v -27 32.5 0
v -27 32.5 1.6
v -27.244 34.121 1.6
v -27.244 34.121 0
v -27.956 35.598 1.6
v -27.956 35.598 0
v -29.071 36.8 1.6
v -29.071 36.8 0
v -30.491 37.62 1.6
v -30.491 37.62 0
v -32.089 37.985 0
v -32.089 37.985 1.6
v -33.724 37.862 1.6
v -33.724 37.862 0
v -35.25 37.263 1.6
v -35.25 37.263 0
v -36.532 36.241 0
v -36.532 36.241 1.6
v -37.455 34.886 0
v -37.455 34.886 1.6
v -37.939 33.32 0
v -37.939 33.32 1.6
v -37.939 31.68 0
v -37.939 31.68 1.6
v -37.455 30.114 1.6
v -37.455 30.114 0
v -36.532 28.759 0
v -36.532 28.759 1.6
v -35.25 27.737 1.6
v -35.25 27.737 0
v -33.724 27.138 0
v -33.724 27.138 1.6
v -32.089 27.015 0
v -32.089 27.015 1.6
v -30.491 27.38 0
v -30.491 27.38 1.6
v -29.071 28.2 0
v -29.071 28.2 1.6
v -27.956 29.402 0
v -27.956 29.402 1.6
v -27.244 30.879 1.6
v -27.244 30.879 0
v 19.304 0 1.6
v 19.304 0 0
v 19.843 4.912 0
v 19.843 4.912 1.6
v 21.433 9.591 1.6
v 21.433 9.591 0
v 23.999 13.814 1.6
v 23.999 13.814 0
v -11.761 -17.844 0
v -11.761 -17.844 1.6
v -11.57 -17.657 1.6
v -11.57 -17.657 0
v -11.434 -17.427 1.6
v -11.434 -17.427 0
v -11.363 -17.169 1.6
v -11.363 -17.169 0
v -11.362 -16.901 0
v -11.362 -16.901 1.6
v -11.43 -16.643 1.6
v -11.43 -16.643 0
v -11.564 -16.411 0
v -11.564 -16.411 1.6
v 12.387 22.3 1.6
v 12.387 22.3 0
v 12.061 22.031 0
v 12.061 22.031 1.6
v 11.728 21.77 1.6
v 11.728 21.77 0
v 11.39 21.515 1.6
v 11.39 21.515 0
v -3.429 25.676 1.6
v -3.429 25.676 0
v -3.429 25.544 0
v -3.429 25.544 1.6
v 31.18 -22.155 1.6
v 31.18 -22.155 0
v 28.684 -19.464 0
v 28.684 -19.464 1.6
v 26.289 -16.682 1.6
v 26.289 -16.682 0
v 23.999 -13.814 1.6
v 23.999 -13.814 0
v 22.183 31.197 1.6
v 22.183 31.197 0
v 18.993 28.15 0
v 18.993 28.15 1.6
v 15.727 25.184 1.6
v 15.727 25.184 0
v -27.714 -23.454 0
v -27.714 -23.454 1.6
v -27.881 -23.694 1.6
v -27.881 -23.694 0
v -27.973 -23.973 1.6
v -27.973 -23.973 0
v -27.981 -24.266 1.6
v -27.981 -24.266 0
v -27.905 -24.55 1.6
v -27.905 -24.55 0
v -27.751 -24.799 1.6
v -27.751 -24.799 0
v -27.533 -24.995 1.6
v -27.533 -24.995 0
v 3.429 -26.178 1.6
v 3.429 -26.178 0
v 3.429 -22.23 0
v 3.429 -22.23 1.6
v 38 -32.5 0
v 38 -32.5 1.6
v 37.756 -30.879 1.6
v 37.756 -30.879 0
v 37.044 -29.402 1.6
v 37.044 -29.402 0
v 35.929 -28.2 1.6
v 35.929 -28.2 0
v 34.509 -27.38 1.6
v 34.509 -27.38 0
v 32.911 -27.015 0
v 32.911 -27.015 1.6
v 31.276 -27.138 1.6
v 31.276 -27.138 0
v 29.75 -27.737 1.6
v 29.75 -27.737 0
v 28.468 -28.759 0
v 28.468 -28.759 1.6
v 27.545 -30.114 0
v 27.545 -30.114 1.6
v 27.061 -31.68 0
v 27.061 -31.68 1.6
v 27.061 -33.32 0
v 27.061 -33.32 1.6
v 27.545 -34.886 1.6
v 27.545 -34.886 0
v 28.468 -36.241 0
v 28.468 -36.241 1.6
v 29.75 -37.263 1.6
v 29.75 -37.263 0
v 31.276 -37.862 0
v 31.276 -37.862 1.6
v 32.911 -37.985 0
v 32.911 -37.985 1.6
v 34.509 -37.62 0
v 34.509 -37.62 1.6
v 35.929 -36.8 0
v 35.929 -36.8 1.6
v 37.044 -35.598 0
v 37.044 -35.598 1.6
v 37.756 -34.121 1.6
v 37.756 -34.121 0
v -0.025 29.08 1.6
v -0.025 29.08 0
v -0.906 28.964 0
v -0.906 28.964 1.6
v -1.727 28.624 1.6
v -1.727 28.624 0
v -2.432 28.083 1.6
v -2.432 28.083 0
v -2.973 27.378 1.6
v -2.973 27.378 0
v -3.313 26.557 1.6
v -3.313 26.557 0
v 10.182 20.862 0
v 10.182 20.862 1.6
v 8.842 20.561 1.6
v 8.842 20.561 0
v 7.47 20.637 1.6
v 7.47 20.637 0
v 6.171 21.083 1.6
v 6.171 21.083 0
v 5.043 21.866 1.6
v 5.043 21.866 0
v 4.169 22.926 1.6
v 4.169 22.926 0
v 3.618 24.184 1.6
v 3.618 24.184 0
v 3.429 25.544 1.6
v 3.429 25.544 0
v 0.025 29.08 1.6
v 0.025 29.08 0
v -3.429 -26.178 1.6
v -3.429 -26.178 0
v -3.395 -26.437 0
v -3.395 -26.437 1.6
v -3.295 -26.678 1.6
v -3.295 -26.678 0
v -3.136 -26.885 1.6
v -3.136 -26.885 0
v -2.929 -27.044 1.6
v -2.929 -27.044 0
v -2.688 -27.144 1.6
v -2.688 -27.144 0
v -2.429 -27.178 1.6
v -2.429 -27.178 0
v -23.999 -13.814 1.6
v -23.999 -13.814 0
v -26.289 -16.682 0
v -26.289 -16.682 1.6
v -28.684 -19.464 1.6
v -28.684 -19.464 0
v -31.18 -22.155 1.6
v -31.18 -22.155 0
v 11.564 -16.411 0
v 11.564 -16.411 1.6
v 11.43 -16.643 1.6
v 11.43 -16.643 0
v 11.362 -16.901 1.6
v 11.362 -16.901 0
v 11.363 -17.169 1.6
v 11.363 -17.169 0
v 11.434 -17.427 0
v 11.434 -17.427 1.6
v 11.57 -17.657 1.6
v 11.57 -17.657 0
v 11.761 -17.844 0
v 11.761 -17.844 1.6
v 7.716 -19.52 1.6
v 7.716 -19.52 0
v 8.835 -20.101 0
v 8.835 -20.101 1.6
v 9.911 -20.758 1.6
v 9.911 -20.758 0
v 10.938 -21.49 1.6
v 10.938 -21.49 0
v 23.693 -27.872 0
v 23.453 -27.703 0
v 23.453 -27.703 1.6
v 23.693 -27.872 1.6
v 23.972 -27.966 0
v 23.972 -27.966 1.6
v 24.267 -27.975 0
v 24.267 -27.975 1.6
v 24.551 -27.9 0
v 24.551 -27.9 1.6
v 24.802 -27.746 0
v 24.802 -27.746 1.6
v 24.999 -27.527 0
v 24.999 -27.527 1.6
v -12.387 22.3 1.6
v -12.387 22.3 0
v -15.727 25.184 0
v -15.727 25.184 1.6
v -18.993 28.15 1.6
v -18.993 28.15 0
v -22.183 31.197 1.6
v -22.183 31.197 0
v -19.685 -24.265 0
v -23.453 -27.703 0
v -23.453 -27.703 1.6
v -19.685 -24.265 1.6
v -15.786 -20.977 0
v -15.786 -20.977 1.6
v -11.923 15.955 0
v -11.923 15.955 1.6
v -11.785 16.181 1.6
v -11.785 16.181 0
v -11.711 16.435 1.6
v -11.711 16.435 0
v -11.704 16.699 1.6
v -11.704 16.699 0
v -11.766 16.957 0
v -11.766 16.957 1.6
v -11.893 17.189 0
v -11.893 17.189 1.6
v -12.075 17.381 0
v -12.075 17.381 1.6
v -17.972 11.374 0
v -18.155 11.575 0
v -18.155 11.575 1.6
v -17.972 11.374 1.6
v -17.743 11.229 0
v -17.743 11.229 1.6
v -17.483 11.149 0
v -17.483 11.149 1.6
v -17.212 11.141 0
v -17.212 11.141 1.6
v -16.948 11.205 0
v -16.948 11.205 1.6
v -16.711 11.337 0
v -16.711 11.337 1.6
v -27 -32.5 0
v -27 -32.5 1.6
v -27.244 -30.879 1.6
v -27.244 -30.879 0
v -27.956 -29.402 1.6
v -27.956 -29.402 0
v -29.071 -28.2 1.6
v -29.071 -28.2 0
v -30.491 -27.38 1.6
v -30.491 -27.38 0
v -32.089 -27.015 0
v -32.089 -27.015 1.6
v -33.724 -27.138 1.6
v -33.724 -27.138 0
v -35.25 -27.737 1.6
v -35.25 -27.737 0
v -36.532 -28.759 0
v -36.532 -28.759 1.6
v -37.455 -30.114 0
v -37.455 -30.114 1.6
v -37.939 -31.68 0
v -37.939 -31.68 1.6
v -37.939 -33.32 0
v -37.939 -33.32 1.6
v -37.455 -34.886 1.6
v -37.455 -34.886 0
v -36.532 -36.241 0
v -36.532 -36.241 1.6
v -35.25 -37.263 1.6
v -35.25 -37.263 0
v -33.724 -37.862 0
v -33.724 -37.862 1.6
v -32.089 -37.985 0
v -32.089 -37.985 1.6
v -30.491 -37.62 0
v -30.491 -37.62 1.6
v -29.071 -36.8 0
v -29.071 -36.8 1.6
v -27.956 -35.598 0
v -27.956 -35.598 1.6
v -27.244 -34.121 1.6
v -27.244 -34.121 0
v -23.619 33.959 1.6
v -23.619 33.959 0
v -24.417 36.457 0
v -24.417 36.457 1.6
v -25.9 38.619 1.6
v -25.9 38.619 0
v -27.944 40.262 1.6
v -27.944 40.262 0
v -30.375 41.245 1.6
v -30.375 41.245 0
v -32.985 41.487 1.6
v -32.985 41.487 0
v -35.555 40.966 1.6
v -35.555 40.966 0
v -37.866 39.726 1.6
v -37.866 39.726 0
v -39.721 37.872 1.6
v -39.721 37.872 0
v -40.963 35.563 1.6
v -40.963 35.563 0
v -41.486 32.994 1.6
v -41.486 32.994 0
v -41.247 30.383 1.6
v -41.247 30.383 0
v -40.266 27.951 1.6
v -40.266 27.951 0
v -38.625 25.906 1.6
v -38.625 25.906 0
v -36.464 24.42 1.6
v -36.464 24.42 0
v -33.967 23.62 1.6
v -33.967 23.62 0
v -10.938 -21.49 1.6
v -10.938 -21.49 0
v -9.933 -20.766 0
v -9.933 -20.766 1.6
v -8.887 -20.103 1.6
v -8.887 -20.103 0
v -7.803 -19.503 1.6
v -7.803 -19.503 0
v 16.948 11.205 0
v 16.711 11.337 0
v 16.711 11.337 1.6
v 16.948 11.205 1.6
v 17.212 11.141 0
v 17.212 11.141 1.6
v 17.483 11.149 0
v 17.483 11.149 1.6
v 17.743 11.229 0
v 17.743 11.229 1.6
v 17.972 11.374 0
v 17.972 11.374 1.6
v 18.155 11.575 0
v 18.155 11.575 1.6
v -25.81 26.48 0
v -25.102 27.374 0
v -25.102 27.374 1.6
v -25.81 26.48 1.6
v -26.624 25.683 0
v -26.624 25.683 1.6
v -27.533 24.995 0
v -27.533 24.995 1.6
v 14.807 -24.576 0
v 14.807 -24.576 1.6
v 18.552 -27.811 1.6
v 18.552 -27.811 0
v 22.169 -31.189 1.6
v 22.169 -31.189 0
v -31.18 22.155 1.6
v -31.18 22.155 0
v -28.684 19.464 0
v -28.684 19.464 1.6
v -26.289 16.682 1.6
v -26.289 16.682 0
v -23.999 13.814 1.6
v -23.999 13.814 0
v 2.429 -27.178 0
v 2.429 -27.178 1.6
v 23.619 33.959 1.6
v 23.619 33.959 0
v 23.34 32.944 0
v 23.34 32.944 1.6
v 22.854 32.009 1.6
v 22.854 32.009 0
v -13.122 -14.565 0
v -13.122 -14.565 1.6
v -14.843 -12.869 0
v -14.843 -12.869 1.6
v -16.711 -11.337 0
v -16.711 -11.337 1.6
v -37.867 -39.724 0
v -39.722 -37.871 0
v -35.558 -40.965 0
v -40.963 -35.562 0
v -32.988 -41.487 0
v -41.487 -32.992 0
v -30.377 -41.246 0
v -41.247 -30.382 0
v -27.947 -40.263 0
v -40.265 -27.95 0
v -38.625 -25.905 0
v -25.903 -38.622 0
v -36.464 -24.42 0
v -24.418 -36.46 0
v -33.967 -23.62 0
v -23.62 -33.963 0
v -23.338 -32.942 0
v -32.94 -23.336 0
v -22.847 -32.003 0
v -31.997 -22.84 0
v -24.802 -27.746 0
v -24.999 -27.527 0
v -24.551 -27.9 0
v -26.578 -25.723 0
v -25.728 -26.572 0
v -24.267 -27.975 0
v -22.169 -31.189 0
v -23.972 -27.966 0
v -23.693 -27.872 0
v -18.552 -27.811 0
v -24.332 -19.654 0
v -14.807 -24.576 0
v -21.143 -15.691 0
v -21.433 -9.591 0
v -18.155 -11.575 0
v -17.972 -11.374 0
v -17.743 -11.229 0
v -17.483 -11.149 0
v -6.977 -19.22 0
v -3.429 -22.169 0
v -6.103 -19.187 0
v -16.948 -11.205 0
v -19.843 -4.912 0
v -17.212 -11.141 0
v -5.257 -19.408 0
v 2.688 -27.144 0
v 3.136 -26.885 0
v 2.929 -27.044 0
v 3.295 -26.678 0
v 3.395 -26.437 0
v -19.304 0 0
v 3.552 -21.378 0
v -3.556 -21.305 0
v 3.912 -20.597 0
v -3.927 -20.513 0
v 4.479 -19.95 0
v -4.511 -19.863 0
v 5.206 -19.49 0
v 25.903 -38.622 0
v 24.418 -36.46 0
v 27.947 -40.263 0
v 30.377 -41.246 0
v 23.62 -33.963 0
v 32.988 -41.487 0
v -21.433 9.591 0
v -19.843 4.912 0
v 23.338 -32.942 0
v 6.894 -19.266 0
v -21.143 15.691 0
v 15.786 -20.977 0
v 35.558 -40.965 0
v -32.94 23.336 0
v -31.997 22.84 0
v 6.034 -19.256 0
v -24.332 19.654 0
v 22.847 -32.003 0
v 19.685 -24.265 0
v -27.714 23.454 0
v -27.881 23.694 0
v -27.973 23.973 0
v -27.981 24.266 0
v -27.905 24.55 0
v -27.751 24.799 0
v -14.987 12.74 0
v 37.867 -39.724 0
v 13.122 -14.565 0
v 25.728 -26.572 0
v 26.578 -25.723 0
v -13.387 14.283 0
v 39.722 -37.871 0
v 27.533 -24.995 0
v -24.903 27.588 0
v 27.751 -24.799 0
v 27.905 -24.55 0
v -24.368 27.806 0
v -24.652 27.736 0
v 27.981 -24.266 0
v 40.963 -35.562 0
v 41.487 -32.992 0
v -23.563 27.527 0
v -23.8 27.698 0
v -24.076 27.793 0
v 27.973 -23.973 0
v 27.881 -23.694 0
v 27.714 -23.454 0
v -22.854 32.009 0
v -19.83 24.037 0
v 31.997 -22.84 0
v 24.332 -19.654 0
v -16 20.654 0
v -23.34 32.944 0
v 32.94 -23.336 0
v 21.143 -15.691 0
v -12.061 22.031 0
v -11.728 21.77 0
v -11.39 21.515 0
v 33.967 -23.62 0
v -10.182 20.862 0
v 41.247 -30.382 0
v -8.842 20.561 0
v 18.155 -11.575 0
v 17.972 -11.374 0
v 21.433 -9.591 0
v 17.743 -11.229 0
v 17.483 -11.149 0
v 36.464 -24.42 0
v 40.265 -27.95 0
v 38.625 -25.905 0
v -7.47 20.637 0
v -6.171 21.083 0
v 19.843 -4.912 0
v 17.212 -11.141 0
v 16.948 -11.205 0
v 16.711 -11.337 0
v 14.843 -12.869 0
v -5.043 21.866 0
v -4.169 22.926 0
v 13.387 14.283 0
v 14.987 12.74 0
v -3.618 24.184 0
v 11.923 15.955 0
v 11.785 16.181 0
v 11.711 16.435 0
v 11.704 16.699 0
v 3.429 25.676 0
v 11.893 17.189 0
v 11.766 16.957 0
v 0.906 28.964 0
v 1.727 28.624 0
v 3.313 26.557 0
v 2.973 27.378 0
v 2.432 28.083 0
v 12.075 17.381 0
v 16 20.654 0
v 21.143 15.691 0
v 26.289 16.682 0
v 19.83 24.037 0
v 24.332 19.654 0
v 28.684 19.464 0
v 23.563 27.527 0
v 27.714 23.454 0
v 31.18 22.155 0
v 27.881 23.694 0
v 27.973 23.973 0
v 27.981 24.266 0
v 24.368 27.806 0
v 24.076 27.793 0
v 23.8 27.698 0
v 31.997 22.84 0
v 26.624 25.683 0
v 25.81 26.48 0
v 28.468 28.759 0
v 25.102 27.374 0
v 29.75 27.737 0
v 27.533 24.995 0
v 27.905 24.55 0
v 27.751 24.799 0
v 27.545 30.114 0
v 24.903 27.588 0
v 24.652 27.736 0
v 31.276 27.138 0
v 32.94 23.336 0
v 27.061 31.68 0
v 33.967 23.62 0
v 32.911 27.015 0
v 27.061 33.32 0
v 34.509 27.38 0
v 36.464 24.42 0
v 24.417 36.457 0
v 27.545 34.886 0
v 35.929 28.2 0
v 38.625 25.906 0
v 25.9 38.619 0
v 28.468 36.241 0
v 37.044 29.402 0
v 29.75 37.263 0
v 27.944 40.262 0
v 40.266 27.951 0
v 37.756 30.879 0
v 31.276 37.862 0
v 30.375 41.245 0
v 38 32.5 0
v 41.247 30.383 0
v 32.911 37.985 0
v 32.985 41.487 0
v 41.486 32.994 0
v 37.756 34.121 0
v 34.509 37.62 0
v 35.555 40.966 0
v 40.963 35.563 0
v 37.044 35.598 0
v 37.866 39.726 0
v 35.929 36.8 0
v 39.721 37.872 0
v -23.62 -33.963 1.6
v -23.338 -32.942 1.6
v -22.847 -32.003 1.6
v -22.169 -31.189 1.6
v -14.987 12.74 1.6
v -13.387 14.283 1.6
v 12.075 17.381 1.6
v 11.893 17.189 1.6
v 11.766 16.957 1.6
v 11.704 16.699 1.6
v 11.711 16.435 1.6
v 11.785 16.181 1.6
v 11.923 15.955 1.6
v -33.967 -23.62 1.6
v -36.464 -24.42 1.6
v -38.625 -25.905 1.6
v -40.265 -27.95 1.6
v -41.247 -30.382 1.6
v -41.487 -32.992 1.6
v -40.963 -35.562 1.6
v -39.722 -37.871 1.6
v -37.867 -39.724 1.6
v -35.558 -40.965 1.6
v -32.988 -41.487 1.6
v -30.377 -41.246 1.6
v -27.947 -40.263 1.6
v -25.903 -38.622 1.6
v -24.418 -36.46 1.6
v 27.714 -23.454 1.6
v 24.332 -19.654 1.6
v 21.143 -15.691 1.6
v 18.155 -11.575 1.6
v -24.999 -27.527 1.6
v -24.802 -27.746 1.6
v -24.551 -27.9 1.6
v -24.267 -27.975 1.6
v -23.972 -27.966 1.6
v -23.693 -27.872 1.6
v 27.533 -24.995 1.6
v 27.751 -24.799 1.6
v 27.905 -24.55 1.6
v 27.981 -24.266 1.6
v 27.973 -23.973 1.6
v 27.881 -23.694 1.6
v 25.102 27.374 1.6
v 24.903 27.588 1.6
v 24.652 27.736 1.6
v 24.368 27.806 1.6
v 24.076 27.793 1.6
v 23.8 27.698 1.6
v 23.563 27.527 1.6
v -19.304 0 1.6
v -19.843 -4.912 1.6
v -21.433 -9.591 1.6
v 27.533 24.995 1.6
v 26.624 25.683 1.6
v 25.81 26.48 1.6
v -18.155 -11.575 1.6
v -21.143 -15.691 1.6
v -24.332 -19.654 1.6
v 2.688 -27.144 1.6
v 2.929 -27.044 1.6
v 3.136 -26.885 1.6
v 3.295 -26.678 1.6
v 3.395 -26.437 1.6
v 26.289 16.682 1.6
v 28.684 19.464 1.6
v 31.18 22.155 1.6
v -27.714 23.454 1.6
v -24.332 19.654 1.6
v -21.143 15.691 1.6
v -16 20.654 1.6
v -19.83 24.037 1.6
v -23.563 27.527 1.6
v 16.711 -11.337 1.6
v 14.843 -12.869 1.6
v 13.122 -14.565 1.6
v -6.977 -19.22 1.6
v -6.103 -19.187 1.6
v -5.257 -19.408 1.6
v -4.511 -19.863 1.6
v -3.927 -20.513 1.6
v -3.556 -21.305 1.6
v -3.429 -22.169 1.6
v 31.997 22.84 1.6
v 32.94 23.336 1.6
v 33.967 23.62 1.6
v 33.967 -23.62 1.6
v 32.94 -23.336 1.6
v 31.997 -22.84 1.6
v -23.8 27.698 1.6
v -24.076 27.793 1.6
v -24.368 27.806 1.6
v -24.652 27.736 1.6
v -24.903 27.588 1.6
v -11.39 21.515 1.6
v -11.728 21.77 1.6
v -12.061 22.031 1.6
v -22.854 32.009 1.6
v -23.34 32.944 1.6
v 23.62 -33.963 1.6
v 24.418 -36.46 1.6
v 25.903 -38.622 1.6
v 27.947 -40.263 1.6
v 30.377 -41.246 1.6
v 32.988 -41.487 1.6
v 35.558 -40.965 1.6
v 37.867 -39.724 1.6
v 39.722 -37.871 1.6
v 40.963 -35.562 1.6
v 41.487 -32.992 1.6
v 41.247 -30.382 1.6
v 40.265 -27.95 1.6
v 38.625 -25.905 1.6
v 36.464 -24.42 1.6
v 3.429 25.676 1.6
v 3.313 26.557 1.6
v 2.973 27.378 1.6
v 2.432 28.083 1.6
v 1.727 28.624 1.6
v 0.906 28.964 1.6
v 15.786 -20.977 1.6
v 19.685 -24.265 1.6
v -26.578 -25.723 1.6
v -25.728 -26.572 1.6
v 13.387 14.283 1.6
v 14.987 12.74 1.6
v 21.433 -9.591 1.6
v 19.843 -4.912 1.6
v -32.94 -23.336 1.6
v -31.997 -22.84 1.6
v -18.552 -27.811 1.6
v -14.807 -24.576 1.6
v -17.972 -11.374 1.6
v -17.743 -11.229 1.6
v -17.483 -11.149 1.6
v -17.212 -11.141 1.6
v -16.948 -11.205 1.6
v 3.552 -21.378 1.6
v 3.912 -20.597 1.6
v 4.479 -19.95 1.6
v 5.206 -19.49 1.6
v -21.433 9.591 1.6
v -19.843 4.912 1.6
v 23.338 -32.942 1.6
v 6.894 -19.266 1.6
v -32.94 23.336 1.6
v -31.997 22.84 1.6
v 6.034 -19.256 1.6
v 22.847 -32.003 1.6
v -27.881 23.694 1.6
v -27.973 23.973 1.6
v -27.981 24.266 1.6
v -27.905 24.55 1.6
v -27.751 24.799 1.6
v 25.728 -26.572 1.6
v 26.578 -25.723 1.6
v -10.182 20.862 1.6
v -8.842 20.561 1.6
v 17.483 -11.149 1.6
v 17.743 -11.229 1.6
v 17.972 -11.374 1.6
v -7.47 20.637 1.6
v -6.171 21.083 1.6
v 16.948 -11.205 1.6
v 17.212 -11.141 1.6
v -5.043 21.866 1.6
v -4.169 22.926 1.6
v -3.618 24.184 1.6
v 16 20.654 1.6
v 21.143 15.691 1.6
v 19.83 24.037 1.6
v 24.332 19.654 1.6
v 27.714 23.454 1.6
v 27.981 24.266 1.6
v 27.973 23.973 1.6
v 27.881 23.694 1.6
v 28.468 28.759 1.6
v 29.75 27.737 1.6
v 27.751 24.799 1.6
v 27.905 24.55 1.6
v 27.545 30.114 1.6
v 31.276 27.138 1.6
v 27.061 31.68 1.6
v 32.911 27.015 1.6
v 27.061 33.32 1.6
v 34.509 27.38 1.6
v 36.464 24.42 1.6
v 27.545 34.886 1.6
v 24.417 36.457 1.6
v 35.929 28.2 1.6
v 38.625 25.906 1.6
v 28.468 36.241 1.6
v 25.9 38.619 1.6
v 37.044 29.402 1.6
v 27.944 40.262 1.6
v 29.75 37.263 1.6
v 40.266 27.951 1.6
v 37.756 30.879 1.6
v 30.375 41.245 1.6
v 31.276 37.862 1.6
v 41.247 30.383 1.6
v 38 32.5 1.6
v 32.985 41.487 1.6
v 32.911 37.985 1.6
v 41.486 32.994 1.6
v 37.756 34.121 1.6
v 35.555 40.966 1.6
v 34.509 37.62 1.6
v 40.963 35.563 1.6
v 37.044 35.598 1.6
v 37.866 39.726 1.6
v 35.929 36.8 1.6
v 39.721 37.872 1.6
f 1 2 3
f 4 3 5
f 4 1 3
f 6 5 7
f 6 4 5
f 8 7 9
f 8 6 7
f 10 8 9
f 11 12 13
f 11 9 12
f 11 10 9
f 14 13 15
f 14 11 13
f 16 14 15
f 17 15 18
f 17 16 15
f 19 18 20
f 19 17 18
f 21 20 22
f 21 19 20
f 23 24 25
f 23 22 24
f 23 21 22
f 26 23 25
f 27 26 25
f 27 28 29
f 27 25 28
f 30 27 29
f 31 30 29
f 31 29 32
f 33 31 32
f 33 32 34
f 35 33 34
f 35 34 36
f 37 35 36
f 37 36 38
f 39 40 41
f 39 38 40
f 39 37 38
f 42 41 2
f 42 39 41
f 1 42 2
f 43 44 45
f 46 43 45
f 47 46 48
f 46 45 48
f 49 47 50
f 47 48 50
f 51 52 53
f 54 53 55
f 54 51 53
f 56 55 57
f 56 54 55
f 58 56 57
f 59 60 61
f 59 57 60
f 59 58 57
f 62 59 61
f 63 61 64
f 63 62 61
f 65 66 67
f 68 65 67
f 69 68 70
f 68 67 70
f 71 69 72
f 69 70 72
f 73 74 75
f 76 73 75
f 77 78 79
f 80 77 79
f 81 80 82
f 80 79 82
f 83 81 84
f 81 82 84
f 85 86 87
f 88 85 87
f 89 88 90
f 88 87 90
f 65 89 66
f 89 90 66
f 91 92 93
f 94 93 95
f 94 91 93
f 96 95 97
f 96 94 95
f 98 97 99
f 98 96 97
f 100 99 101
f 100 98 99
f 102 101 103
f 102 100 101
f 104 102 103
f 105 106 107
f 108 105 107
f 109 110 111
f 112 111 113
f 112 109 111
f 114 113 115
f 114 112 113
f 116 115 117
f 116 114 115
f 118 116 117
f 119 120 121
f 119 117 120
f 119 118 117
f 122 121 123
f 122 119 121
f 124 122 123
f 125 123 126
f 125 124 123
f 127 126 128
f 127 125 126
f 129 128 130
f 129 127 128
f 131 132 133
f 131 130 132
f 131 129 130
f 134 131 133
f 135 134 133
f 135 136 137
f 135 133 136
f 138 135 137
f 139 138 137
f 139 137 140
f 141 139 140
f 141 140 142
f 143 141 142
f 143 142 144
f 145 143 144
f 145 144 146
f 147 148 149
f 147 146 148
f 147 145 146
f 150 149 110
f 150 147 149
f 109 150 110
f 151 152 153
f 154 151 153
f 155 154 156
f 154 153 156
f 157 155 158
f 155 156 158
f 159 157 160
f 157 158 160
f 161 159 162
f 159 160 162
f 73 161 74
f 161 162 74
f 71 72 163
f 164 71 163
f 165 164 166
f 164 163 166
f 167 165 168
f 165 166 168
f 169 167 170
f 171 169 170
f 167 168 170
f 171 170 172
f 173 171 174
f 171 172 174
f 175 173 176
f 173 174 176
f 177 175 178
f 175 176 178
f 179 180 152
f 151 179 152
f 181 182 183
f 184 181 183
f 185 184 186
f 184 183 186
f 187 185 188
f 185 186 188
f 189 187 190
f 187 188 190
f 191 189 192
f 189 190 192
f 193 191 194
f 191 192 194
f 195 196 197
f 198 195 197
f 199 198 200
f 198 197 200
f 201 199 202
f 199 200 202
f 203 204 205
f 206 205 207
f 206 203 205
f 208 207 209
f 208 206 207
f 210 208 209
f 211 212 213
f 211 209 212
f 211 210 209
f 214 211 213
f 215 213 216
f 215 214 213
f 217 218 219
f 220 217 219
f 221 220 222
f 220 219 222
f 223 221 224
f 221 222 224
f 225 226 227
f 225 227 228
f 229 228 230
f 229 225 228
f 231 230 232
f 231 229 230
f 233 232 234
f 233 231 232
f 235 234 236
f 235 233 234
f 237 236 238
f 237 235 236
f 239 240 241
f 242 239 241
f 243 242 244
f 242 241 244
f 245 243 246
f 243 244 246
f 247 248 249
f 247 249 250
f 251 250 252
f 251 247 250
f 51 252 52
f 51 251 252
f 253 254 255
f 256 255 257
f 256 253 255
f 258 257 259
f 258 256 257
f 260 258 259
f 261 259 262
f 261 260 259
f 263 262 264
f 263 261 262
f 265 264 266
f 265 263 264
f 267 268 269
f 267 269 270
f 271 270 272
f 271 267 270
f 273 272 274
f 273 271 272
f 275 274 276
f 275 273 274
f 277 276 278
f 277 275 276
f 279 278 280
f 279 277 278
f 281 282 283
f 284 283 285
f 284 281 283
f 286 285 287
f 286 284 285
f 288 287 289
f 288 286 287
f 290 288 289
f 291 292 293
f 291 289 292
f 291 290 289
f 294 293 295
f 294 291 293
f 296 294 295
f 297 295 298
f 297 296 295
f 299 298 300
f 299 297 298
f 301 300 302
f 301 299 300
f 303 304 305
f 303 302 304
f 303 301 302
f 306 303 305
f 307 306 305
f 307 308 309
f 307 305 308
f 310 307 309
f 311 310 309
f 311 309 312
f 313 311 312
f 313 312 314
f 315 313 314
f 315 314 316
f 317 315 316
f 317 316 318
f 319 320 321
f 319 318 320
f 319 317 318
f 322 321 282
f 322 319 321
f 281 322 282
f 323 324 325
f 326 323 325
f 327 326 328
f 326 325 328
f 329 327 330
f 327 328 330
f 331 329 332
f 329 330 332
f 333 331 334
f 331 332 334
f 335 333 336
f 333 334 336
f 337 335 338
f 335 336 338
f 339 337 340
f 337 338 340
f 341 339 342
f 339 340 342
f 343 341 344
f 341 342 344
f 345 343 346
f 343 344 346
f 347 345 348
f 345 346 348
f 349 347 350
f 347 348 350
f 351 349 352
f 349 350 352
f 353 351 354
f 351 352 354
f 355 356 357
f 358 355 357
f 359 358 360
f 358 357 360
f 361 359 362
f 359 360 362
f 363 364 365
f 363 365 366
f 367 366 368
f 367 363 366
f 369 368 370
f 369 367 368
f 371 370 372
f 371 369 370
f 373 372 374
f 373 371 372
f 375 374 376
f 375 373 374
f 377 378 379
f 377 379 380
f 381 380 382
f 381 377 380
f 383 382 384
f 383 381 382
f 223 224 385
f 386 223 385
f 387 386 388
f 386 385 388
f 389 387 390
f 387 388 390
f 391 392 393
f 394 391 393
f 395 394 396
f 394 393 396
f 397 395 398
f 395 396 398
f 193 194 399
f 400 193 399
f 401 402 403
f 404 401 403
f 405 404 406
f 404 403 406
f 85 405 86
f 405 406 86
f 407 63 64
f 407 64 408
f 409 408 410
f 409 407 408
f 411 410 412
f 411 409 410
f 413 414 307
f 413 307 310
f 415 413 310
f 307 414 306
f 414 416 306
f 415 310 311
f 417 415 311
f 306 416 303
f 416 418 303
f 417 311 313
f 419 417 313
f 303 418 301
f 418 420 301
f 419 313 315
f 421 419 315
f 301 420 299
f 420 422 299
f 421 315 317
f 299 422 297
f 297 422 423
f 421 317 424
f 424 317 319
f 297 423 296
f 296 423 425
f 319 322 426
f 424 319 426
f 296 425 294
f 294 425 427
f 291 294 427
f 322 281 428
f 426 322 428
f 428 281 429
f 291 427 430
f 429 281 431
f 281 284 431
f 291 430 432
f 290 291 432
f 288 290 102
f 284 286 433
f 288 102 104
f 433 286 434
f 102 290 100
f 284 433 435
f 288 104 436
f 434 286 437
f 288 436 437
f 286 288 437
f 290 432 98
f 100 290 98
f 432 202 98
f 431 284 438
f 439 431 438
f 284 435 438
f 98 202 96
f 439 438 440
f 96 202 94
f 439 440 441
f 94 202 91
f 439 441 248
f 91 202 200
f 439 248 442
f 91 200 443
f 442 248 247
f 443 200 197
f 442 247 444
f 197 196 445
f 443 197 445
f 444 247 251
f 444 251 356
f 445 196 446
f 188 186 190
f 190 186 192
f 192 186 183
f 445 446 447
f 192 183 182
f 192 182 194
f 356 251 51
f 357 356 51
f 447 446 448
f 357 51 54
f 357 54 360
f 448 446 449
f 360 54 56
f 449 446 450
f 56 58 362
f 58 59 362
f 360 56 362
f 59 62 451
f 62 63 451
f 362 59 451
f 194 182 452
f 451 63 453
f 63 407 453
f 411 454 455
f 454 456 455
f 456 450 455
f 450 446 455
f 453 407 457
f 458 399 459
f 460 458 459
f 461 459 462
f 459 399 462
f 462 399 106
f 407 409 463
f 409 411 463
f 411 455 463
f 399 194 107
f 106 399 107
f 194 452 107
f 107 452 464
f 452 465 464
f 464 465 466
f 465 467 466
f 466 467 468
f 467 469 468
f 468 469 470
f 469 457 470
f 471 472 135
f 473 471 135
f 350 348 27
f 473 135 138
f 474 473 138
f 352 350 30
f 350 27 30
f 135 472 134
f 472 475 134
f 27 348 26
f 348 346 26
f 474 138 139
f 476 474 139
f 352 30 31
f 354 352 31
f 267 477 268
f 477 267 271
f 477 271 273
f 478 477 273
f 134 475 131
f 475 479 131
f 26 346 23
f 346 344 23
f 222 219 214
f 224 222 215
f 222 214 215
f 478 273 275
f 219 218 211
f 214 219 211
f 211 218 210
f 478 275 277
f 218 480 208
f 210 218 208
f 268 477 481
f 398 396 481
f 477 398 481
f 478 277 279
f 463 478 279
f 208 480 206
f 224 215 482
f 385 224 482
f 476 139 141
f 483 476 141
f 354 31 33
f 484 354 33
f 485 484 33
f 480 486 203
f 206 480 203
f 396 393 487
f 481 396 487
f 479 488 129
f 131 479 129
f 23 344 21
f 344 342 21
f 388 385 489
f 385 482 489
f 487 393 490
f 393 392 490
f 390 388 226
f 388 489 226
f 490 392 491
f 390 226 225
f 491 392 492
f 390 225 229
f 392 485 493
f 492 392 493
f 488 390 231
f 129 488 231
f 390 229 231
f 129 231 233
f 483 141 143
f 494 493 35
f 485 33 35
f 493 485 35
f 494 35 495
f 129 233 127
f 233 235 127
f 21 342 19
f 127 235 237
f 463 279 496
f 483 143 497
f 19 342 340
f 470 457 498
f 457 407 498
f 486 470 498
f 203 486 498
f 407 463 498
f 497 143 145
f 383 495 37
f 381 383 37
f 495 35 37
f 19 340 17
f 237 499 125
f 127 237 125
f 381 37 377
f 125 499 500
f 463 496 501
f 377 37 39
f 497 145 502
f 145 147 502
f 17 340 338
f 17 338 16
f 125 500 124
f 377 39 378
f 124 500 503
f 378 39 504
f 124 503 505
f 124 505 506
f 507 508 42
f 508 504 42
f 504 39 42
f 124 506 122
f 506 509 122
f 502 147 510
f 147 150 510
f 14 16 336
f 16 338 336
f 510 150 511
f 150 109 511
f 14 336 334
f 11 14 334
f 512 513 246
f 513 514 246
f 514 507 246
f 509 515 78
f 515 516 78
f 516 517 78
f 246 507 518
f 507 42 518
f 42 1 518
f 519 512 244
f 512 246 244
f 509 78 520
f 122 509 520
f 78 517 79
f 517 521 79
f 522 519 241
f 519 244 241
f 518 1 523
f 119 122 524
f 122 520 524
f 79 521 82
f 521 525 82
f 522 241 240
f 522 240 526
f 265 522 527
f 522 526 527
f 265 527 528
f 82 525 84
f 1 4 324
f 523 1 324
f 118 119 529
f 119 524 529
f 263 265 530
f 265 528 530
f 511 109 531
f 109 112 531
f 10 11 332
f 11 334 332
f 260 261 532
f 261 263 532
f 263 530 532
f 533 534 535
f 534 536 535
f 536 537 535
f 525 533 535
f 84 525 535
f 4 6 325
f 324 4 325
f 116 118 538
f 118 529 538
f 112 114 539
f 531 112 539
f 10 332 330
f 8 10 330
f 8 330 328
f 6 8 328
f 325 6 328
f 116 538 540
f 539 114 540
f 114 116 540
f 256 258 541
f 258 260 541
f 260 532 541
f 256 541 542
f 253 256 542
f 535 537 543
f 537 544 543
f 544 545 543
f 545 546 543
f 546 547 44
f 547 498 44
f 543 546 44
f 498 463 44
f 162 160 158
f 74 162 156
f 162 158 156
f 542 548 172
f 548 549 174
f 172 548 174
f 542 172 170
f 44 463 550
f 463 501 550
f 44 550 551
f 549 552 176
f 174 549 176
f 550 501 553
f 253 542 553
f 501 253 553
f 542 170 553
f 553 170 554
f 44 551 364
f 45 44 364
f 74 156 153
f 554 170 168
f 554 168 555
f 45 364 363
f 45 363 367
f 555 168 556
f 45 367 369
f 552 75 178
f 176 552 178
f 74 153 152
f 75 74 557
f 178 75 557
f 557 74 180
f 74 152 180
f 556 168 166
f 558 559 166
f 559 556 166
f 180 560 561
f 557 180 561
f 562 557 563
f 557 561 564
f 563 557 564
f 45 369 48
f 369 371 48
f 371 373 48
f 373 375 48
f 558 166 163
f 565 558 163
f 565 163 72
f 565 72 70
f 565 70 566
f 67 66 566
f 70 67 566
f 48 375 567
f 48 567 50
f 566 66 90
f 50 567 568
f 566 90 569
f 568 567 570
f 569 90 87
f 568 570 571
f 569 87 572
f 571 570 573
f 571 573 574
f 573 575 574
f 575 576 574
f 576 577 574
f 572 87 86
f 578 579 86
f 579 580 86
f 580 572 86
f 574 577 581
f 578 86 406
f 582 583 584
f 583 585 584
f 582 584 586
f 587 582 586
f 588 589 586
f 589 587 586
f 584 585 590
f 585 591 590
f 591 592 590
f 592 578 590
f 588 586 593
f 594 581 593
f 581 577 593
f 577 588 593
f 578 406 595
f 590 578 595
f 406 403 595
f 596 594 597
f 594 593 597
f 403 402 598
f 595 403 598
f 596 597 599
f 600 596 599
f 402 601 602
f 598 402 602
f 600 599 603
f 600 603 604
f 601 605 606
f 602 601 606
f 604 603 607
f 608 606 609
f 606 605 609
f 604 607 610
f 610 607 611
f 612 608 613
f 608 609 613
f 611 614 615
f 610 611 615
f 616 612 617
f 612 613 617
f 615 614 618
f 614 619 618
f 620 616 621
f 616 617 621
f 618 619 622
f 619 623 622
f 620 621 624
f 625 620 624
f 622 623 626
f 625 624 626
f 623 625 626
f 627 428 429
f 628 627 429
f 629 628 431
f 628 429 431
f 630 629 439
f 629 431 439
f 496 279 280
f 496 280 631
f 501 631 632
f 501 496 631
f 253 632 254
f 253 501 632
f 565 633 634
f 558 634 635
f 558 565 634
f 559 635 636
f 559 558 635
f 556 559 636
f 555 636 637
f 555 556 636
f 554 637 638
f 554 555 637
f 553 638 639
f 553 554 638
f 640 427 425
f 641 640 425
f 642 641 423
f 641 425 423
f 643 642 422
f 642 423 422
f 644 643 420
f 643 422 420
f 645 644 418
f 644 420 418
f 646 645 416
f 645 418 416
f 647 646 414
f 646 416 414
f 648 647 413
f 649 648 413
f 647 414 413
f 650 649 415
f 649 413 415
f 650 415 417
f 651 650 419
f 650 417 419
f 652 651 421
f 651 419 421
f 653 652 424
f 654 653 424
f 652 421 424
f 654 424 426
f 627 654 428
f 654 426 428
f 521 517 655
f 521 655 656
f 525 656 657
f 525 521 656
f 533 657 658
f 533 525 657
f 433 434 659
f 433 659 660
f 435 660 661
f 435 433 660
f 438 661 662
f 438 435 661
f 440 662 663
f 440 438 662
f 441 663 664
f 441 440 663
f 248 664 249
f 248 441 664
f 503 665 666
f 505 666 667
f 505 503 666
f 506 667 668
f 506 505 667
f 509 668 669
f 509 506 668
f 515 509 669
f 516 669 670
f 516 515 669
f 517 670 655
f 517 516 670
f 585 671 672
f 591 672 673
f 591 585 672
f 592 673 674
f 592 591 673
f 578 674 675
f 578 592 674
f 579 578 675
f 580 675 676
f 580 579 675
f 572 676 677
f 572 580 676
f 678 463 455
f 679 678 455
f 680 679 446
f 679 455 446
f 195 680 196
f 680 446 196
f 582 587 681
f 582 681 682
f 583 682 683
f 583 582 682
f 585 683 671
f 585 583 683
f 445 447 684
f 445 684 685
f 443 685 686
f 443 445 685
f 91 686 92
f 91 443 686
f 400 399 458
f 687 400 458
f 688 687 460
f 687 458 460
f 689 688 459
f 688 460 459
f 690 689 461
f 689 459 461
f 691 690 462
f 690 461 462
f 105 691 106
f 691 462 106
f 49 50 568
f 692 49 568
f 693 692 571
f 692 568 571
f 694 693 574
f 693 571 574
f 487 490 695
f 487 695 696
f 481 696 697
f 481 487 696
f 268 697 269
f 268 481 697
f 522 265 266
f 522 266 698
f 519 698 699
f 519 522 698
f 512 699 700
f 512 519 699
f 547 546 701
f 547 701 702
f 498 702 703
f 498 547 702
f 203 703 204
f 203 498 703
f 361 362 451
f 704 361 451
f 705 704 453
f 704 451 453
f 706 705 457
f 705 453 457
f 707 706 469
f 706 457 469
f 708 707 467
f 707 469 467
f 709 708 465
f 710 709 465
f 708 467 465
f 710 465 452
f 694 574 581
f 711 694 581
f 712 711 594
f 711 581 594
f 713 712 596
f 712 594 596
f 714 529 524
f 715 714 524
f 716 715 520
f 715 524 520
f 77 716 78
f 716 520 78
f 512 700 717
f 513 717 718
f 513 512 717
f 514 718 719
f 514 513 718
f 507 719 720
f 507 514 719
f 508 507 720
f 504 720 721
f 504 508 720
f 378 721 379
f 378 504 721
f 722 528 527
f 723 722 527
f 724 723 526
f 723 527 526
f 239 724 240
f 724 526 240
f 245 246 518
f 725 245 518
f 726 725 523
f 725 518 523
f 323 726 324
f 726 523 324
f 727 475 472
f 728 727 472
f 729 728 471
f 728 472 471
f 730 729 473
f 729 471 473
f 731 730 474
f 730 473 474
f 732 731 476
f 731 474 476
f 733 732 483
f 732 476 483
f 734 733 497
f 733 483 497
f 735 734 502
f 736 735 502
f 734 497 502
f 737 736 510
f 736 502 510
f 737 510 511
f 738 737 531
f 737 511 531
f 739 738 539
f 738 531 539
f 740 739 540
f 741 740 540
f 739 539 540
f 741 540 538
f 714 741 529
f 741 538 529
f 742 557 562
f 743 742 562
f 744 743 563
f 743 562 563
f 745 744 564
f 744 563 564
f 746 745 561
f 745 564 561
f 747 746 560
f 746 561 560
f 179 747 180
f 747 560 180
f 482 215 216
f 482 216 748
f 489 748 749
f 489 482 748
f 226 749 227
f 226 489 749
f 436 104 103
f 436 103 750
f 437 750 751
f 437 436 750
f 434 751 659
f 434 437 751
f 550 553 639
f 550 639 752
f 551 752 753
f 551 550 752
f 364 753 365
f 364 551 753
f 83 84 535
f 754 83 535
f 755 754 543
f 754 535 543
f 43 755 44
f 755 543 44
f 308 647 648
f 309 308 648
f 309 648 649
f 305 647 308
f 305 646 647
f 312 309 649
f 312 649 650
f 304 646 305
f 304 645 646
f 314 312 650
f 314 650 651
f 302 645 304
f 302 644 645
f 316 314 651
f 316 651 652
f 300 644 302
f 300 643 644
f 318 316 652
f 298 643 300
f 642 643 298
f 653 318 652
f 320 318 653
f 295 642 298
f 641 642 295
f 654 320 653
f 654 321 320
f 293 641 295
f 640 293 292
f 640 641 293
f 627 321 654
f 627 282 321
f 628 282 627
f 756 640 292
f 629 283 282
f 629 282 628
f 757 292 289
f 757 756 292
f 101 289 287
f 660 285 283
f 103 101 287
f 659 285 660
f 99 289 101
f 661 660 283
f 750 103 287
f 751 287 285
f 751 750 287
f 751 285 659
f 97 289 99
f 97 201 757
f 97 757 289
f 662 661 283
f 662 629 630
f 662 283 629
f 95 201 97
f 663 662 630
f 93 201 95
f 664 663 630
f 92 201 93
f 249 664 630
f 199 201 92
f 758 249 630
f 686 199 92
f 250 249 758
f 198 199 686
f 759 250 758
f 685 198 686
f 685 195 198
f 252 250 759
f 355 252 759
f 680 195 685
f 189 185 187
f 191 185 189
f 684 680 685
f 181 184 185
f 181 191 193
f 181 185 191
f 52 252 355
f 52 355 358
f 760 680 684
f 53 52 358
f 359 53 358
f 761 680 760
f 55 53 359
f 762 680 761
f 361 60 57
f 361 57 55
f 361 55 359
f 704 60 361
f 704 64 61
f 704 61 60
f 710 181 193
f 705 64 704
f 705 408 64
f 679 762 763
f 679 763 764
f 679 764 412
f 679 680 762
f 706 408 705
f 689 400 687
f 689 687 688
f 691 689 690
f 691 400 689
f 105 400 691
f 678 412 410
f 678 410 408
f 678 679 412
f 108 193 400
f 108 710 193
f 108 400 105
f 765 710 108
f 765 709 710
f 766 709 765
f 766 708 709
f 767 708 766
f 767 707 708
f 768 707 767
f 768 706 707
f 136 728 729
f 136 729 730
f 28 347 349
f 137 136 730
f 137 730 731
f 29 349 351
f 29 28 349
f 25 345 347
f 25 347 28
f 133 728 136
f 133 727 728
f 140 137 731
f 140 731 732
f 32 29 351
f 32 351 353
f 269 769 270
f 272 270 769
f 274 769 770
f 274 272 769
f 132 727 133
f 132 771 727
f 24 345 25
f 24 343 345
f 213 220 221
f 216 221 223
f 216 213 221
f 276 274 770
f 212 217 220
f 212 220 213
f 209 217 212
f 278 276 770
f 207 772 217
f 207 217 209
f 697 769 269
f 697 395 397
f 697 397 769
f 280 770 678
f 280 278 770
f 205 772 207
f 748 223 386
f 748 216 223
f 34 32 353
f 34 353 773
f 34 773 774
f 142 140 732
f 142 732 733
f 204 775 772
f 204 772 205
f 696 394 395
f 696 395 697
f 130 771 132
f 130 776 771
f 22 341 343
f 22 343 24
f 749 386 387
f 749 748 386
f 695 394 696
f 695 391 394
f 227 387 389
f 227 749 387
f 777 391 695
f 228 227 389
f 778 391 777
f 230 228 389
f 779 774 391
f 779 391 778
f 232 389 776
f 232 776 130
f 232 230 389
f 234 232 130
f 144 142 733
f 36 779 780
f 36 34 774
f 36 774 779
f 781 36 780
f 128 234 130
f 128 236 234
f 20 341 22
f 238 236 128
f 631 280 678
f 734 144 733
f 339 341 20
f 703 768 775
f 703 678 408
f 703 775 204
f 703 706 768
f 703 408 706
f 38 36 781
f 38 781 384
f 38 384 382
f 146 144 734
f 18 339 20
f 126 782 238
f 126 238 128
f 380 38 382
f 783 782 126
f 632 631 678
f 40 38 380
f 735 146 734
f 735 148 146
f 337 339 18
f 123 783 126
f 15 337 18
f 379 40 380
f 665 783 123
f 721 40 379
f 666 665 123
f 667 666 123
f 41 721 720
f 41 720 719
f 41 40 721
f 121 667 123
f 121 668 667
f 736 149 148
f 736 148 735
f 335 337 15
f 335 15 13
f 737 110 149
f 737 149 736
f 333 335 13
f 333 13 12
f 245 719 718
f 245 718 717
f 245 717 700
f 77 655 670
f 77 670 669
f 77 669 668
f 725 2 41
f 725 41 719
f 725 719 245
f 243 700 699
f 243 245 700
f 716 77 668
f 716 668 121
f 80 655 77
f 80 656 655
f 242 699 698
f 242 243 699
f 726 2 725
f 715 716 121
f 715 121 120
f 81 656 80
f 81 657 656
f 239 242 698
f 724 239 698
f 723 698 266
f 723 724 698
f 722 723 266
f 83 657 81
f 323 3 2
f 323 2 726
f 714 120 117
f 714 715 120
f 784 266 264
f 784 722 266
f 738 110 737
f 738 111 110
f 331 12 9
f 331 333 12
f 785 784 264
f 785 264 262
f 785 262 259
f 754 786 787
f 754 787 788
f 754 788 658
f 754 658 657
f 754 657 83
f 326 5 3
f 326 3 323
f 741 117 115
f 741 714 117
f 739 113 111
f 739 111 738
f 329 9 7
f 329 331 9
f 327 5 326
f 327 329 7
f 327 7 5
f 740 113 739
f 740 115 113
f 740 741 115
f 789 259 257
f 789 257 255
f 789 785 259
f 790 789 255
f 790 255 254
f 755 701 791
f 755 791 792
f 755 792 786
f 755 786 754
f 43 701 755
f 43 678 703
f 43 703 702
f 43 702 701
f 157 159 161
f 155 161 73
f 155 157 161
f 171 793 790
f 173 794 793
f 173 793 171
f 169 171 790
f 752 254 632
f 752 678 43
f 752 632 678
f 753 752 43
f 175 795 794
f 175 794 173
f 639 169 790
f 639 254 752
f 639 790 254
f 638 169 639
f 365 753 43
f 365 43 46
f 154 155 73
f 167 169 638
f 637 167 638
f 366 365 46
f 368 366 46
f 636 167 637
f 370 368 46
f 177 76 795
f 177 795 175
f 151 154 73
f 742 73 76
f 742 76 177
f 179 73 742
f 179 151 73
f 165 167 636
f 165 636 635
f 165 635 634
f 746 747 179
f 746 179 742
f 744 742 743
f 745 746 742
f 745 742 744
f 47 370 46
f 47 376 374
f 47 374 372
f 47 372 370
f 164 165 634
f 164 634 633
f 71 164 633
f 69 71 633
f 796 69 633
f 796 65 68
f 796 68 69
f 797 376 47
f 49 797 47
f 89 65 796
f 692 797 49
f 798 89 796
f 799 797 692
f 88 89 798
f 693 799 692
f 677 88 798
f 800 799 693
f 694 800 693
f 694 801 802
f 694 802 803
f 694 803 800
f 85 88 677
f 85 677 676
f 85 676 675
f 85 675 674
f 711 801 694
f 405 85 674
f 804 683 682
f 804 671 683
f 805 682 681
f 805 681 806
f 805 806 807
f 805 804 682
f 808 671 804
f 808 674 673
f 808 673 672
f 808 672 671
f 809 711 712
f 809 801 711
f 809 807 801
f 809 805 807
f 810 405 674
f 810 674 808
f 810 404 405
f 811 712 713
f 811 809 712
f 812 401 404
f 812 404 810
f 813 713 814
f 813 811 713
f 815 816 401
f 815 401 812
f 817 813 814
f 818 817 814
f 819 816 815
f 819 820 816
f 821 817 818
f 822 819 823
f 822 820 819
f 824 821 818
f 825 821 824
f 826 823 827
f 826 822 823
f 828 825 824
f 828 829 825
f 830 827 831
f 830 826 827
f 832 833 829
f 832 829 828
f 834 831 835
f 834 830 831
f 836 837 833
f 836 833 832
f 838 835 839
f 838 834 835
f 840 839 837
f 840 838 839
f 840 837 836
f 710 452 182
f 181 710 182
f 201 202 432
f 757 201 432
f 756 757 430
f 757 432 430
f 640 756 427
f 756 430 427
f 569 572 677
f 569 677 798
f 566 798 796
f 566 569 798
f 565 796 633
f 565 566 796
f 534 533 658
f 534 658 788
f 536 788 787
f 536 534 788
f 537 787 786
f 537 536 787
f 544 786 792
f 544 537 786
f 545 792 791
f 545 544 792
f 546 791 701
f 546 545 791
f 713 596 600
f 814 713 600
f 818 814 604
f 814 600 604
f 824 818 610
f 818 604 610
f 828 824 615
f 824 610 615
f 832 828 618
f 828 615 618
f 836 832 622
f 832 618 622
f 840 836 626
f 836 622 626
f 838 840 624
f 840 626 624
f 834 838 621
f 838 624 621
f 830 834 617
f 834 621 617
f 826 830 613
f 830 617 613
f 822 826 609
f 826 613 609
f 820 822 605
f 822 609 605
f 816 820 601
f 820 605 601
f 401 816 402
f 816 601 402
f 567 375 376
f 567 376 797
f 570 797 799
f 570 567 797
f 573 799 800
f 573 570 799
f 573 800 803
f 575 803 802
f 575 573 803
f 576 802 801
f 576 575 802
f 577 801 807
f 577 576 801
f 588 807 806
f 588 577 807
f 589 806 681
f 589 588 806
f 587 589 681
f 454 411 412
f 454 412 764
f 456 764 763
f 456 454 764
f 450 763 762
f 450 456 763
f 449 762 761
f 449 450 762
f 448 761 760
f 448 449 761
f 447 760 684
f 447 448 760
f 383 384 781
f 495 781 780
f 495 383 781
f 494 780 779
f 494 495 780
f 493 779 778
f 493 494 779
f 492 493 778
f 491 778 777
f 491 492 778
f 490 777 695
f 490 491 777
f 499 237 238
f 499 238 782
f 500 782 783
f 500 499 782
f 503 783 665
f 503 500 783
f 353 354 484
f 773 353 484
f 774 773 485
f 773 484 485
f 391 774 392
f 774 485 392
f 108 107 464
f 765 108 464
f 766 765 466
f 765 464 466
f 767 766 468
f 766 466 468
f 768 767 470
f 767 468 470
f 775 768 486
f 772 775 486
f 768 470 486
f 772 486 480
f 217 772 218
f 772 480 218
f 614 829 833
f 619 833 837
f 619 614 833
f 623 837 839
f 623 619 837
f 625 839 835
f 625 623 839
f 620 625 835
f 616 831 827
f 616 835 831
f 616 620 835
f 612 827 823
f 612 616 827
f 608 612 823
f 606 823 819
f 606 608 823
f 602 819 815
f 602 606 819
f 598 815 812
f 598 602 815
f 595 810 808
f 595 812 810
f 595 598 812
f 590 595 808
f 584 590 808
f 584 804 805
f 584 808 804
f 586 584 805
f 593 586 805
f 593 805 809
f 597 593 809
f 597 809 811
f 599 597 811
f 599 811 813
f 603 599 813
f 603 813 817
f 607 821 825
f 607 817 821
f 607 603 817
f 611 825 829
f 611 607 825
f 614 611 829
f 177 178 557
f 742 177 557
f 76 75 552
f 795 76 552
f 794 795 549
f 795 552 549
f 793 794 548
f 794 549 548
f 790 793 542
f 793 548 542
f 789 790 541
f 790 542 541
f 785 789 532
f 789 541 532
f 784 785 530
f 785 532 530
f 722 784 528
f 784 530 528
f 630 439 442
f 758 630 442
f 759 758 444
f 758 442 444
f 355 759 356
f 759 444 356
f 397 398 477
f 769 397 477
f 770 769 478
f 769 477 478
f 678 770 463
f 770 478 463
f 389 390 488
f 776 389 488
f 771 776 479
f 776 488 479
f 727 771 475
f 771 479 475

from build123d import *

# Parameters (mm, degrees)
BOSS_EXTRUDE1_DEPTH = 1.6
SKETCH1_5_R         = 5.5
CUT_EXTRUDE3_DEPTH  = 59.711668346


with BuildPart() as part:
    # Sketch1 → Boss-Extrude1 (new body)
    with BuildSketch(Plane.XY):
        with BuildLine():
            Line((-3.429, -22.169410702), (-3.429, -26.178))
            ThreePointArc((-3.429, -26.178), (-3.136106781, -26.885106781), (-2.429, -27.178))
            Line((-2.429, -27.178), (2.429, -27.178))
            ThreePointArc((2.429, -27.178), (3.136106781, -26.885106781), (3.429, -26.178))
            Line((3.429, -26.178), (3.429, -22.22966812))
            ThreePointArc((3.429, -22.22966812), (4.826254657, -19.693685595), (7.716471578, -19.519978666))
            ThreePointArc((7.716471578, -19.519978666), (9.379032197, -20.419956769), (10.937907763, -21.489524611))
            ThreePointArc((10.937907763, -21.489524611), (16.695290309, -26.175210804), (22.169453406, -31.188856909))
            ThreePointArc((22.169453406, -31.188856909), (23.117301861, -32.459556006), (23.619723106, -33.963107063))
            ThreePointArc((23.619723106, -33.963107063), (38.862466656, -38.865455055), (33.967276916, -23.620411133))
            ThreePointArc((33.967276916, -23.620411133), (32.455427267, -23.112806715), (31.180313141, -22.154978144))
            ThreePointArc((31.180313141, -22.154978144), (27.47385025, -18.084321842), (23.999156064, -13.81412159))
            ThreePointArc((23.999156064, -13.81412159), (20.509860624, -7.295108734), (19.304, 0))
            ThreePointArc((19.304, 0), (20.509860624, 7.295108734), (23.999156064, 13.81412159))
            ThreePointArc((23.999156064, 13.81412159), (27.47385025, 18.084321842), (31.180313141, 22.154978144))
            ThreePointArc((31.180313141, 22.154978144), (32.455427267, 23.112806715), (33.967276916, 23.620411133))
            ThreePointArc((33.967276916, 23.620411133), (38.861014354, 38.866906343), (23.61905648, 33.959055239))
            ThreePointArc((23.61905648, 33.959055239), (23.121622823, 32.463531472), (22.183380489, 31.19714571))
            ThreePointArc((22.183380489, 31.19714571), (17.368920037, 26.656724902), (12.387395689, 22.300250899))
            ThreePointArc((12.387395689, 22.300250899), (11.895164251, 21.899521015), (11.389978134, 21.515251299))
            ThreePointArc((11.389978134, 21.515251299), (6.171223513, 21.083006766), (3.429, 25.544222445))
            Line((3.429, 25.544222445), (3.429, 25.6764))
            ThreePointArc((3.429, 25.6764), (2.43210864, 28.08310864), (0.0254, 29.08))
            Line((0.0254, 29.08), (-0.0254, 29.08))
            ThreePointArc((-0.0254, 29.08), (-2.43210864, 28.08310864), (-3.429, 25.6764))
            Line((-3.429, 25.6764), (-3.429, 25.544222445))
            ThreePointArc((-3.429, 25.544222445), (-6.171223513, 21.083006766), (-11.389978134, 21.515251299))
            ThreePointArc((-11.389978134, 21.515251299), (-11.895164251, 21.899521015), (-12.387395689, 22.300250899))
            ThreePointArc((-12.387395689, 22.300250899), (-17.368920037, 26.656724902), (-22.183380489, 31.19714571))
            ThreePointArc((-22.183380489, 31.19714571), (-23.121622823, 32.463531472), (-23.61905648, 33.959055239))
            ThreePointArc((-23.61905648, 33.959055239), (-38.861014354, 38.866906343), (-33.967276916, 23.620411133))
            ThreePointArc((-33.967276916, 23.620411133), (-32.455427267, 23.112806715), (-31.180313141, 22.154978144))
            ThreePointArc((-31.180313141, 22.154978144), (-27.47385025, 18.084321842), (-23.999156064, 13.81412159))
            ThreePointArc((-23.999156064, 13.81412159), (-20.509860624, 7.295108734), (-19.304, 0))
            ThreePointArc((-19.304, 0), (-20.509860624, -7.295108734), (-23.999156064, -13.81412159))
            ThreePointArc((-23.999156064, -13.81412159), (-27.47385025, -18.084321842), (-31.180313141, -22.154978144))
            ThreePointArc((-31.180313141, -22.154978144), (-32.455427267, -23.112806715), (-33.967276916, -23.620411133))
            ThreePointArc((-33.967276916, -23.620411133), (-38.862466656, -38.865455055), (-23.619723106, -33.963107063))
            ThreePointArc((-23.619723106, -33.963107063), (-23.117301861, -32.459556006), (-22.169453406, -31.188856909))
            ThreePointArc((-22.169453406, -31.188856909), (-16.695290309, -26.175210804), (-10.937907763, -21.489524611))
            ThreePointArc((-10.937907763, -21.489524611), (-9.414925724, -20.426362093), (-7.803463878, -19.502793172))
            ThreePointArc((-7.803463878, -19.502793172), (-4.867492977, -19.607829975), (-3.429, -22.169410702))
        make_face()
    extrude(amount=BOSS_EXTRUDE1_DEPTH)

    # Sketch1<5> → Cut-Extrude3 (cut, through all)
    with BuildSketch(Plane.XY):
        with Locations((-32.5, -32.5)):
            Circle(SKETCH1_5_R)
        with Locations((32.5, -32.5)):
            Circle(SKETCH1_5_R)
        with Locations((32.5, 32.5)):
            Circle(SKETCH1_5_R)
        with Locations((-32.5, 32.5)):
            Circle(SKETCH1_5_R)
        with BuildLine():
            ThreePointArc((-24.998680714, -27.527052285), (-24.266539251, -27.975169466), (-23.452541635, -27.702684585))
            ThreePointArc((-23.452541635, -27.702684585), (-17.751335536, -22.602028101), (-11.761197607, -17.84401432))
            ThreePointArc((-11.761197607, -17.84401432), (-11.363038546, -17.168840008), (-11.563944828, -16.411193879))
            ThreePointArc((-11.563944828, -16.411193879), (-13.962913518, -13.697220596), (-16.710750131, -11.337115576))
            ThreePointArc((-16.710750131, -11.337115576), (-17.483496193, -11.148963344), (-18.155018506, -11.575103607))
            ThreePointArc((-18.155018506, -11.575103607), (-22.713350188, -17.692311571), (-27.713994469, -23.453576864))
            ThreePointArc((-27.713994469, -23.453576864), (-27.981074308, -24.266291585), (-27.532770213, -24.994893189))
            ThreePointArc((-27.532770213, -24.994893189), (-26.138464304, -26.133614559), (-24.998680714, -27.527052285))
        make_face()
        with BuildLine():
            ThreePointArc((18.155018506, -11.575103607), (17.483496193, -11.148963344), (16.710750131, -11.337115576))
            ThreePointArc((16.710750131, -11.337115576), (13.962913518, -13.697220596), (11.563944828, -16.411193879))
            ThreePointArc((11.563944828, -16.411193879), (11.363038546, -17.168840008), (11.761197607, -17.84401432))
            ThreePointArc((11.761197607, -17.84401432), (17.751335536, -22.602028101), (23.452541635, -27.702684585))
            ThreePointArc((23.452541635, -27.702684585), (24.266539251, -27.975169466), (24.998680714, -27.527052285))
            ThreePointArc((24.998680714, -27.527052285), (26.138464304, -26.133614559), (27.532770213, -24.994893189))
            ThreePointArc((27.532770213, -24.994893189), (27.981074308, -24.266291585), (27.713994469, -23.453576864))
            ThreePointArc((27.713994469, -23.453576864), (22.713350188, -17.692311571), (18.155018506, -11.575103607))
        make_face()
        with BuildLine():
            ThreePointArc((-12.074975691, 17.380952209), (-17.927124595, 22.331716527), (-23.562984675, 27.527368101))
            ThreePointArc((-23.562984675, 27.527368101), (-24.368188535, 27.806201558), (-25.102498374, 27.37389332))
            ThreePointArc((-25.102498374, 27.37389332), (-26.204243006, 26.068558181), (-27.532770213, 24.994893189))
            ThreePointArc((-27.532770213, 24.994893189), (-27.981074308, 24.266291585), (-27.713994469, 23.453576864))
            ThreePointArc((-27.713994469, 23.453576864), (-22.713350188, 17.692311571), (-18.155018506, 11.575103607))
            ThreePointArc((-18.155018506, 11.575103607), (-17.483496193, 11.148963344), (-16.710750131, 11.337115576))
            ThreePointArc((-16.710750131, 11.337115576), (-14.170722957, 13.494587833), (-11.922695283, 15.954830943))
            ThreePointArc((-11.922695283, 15.954830943), (-11.704234617, 16.699348887), (-12.074975691, 17.380952209))
        make_face()
        with BuildLine():
            ThreePointArc((25.102498374, 27.37389332), (24.368188535, 27.806201558), (23.562984675, 27.527368101))
            ThreePointArc((23.562984675, 27.527368101), (17.927124595, 22.331716527), (12.074975691, 17.380952209))
            ThreePointArc((12.074975691, 17.380952209), (11.704234617, 16.699348887), (11.922695283, 15.954830943))
            ThreePointArc((11.922695283, 15.954830943), (14.170722957, 13.494587833), (16.710750131, 11.337115576))
            ThreePointArc((16.710750131, 11.337115576), (17.483496193, 11.148963344), (18.155018506, 11.575103607))
            ThreePointArc((18.155018506, 11.575103607), (22.713350188, 17.692311571), (27.713994469, 23.453576864))
            ThreePointArc((27.713994469, 23.453576864), (27.981074308, 24.266291585), (27.532770213, 24.994893189))
            ThreePointArc((27.532770213, 24.994893189), (26.204243006, 26.068558181), (25.102498374, 27.37389332))
        make_face()
    extrude(amount=CUT_EXTRUDE3_DEPTH, mode=Mode.SUBTRACT)


solid = part.part
